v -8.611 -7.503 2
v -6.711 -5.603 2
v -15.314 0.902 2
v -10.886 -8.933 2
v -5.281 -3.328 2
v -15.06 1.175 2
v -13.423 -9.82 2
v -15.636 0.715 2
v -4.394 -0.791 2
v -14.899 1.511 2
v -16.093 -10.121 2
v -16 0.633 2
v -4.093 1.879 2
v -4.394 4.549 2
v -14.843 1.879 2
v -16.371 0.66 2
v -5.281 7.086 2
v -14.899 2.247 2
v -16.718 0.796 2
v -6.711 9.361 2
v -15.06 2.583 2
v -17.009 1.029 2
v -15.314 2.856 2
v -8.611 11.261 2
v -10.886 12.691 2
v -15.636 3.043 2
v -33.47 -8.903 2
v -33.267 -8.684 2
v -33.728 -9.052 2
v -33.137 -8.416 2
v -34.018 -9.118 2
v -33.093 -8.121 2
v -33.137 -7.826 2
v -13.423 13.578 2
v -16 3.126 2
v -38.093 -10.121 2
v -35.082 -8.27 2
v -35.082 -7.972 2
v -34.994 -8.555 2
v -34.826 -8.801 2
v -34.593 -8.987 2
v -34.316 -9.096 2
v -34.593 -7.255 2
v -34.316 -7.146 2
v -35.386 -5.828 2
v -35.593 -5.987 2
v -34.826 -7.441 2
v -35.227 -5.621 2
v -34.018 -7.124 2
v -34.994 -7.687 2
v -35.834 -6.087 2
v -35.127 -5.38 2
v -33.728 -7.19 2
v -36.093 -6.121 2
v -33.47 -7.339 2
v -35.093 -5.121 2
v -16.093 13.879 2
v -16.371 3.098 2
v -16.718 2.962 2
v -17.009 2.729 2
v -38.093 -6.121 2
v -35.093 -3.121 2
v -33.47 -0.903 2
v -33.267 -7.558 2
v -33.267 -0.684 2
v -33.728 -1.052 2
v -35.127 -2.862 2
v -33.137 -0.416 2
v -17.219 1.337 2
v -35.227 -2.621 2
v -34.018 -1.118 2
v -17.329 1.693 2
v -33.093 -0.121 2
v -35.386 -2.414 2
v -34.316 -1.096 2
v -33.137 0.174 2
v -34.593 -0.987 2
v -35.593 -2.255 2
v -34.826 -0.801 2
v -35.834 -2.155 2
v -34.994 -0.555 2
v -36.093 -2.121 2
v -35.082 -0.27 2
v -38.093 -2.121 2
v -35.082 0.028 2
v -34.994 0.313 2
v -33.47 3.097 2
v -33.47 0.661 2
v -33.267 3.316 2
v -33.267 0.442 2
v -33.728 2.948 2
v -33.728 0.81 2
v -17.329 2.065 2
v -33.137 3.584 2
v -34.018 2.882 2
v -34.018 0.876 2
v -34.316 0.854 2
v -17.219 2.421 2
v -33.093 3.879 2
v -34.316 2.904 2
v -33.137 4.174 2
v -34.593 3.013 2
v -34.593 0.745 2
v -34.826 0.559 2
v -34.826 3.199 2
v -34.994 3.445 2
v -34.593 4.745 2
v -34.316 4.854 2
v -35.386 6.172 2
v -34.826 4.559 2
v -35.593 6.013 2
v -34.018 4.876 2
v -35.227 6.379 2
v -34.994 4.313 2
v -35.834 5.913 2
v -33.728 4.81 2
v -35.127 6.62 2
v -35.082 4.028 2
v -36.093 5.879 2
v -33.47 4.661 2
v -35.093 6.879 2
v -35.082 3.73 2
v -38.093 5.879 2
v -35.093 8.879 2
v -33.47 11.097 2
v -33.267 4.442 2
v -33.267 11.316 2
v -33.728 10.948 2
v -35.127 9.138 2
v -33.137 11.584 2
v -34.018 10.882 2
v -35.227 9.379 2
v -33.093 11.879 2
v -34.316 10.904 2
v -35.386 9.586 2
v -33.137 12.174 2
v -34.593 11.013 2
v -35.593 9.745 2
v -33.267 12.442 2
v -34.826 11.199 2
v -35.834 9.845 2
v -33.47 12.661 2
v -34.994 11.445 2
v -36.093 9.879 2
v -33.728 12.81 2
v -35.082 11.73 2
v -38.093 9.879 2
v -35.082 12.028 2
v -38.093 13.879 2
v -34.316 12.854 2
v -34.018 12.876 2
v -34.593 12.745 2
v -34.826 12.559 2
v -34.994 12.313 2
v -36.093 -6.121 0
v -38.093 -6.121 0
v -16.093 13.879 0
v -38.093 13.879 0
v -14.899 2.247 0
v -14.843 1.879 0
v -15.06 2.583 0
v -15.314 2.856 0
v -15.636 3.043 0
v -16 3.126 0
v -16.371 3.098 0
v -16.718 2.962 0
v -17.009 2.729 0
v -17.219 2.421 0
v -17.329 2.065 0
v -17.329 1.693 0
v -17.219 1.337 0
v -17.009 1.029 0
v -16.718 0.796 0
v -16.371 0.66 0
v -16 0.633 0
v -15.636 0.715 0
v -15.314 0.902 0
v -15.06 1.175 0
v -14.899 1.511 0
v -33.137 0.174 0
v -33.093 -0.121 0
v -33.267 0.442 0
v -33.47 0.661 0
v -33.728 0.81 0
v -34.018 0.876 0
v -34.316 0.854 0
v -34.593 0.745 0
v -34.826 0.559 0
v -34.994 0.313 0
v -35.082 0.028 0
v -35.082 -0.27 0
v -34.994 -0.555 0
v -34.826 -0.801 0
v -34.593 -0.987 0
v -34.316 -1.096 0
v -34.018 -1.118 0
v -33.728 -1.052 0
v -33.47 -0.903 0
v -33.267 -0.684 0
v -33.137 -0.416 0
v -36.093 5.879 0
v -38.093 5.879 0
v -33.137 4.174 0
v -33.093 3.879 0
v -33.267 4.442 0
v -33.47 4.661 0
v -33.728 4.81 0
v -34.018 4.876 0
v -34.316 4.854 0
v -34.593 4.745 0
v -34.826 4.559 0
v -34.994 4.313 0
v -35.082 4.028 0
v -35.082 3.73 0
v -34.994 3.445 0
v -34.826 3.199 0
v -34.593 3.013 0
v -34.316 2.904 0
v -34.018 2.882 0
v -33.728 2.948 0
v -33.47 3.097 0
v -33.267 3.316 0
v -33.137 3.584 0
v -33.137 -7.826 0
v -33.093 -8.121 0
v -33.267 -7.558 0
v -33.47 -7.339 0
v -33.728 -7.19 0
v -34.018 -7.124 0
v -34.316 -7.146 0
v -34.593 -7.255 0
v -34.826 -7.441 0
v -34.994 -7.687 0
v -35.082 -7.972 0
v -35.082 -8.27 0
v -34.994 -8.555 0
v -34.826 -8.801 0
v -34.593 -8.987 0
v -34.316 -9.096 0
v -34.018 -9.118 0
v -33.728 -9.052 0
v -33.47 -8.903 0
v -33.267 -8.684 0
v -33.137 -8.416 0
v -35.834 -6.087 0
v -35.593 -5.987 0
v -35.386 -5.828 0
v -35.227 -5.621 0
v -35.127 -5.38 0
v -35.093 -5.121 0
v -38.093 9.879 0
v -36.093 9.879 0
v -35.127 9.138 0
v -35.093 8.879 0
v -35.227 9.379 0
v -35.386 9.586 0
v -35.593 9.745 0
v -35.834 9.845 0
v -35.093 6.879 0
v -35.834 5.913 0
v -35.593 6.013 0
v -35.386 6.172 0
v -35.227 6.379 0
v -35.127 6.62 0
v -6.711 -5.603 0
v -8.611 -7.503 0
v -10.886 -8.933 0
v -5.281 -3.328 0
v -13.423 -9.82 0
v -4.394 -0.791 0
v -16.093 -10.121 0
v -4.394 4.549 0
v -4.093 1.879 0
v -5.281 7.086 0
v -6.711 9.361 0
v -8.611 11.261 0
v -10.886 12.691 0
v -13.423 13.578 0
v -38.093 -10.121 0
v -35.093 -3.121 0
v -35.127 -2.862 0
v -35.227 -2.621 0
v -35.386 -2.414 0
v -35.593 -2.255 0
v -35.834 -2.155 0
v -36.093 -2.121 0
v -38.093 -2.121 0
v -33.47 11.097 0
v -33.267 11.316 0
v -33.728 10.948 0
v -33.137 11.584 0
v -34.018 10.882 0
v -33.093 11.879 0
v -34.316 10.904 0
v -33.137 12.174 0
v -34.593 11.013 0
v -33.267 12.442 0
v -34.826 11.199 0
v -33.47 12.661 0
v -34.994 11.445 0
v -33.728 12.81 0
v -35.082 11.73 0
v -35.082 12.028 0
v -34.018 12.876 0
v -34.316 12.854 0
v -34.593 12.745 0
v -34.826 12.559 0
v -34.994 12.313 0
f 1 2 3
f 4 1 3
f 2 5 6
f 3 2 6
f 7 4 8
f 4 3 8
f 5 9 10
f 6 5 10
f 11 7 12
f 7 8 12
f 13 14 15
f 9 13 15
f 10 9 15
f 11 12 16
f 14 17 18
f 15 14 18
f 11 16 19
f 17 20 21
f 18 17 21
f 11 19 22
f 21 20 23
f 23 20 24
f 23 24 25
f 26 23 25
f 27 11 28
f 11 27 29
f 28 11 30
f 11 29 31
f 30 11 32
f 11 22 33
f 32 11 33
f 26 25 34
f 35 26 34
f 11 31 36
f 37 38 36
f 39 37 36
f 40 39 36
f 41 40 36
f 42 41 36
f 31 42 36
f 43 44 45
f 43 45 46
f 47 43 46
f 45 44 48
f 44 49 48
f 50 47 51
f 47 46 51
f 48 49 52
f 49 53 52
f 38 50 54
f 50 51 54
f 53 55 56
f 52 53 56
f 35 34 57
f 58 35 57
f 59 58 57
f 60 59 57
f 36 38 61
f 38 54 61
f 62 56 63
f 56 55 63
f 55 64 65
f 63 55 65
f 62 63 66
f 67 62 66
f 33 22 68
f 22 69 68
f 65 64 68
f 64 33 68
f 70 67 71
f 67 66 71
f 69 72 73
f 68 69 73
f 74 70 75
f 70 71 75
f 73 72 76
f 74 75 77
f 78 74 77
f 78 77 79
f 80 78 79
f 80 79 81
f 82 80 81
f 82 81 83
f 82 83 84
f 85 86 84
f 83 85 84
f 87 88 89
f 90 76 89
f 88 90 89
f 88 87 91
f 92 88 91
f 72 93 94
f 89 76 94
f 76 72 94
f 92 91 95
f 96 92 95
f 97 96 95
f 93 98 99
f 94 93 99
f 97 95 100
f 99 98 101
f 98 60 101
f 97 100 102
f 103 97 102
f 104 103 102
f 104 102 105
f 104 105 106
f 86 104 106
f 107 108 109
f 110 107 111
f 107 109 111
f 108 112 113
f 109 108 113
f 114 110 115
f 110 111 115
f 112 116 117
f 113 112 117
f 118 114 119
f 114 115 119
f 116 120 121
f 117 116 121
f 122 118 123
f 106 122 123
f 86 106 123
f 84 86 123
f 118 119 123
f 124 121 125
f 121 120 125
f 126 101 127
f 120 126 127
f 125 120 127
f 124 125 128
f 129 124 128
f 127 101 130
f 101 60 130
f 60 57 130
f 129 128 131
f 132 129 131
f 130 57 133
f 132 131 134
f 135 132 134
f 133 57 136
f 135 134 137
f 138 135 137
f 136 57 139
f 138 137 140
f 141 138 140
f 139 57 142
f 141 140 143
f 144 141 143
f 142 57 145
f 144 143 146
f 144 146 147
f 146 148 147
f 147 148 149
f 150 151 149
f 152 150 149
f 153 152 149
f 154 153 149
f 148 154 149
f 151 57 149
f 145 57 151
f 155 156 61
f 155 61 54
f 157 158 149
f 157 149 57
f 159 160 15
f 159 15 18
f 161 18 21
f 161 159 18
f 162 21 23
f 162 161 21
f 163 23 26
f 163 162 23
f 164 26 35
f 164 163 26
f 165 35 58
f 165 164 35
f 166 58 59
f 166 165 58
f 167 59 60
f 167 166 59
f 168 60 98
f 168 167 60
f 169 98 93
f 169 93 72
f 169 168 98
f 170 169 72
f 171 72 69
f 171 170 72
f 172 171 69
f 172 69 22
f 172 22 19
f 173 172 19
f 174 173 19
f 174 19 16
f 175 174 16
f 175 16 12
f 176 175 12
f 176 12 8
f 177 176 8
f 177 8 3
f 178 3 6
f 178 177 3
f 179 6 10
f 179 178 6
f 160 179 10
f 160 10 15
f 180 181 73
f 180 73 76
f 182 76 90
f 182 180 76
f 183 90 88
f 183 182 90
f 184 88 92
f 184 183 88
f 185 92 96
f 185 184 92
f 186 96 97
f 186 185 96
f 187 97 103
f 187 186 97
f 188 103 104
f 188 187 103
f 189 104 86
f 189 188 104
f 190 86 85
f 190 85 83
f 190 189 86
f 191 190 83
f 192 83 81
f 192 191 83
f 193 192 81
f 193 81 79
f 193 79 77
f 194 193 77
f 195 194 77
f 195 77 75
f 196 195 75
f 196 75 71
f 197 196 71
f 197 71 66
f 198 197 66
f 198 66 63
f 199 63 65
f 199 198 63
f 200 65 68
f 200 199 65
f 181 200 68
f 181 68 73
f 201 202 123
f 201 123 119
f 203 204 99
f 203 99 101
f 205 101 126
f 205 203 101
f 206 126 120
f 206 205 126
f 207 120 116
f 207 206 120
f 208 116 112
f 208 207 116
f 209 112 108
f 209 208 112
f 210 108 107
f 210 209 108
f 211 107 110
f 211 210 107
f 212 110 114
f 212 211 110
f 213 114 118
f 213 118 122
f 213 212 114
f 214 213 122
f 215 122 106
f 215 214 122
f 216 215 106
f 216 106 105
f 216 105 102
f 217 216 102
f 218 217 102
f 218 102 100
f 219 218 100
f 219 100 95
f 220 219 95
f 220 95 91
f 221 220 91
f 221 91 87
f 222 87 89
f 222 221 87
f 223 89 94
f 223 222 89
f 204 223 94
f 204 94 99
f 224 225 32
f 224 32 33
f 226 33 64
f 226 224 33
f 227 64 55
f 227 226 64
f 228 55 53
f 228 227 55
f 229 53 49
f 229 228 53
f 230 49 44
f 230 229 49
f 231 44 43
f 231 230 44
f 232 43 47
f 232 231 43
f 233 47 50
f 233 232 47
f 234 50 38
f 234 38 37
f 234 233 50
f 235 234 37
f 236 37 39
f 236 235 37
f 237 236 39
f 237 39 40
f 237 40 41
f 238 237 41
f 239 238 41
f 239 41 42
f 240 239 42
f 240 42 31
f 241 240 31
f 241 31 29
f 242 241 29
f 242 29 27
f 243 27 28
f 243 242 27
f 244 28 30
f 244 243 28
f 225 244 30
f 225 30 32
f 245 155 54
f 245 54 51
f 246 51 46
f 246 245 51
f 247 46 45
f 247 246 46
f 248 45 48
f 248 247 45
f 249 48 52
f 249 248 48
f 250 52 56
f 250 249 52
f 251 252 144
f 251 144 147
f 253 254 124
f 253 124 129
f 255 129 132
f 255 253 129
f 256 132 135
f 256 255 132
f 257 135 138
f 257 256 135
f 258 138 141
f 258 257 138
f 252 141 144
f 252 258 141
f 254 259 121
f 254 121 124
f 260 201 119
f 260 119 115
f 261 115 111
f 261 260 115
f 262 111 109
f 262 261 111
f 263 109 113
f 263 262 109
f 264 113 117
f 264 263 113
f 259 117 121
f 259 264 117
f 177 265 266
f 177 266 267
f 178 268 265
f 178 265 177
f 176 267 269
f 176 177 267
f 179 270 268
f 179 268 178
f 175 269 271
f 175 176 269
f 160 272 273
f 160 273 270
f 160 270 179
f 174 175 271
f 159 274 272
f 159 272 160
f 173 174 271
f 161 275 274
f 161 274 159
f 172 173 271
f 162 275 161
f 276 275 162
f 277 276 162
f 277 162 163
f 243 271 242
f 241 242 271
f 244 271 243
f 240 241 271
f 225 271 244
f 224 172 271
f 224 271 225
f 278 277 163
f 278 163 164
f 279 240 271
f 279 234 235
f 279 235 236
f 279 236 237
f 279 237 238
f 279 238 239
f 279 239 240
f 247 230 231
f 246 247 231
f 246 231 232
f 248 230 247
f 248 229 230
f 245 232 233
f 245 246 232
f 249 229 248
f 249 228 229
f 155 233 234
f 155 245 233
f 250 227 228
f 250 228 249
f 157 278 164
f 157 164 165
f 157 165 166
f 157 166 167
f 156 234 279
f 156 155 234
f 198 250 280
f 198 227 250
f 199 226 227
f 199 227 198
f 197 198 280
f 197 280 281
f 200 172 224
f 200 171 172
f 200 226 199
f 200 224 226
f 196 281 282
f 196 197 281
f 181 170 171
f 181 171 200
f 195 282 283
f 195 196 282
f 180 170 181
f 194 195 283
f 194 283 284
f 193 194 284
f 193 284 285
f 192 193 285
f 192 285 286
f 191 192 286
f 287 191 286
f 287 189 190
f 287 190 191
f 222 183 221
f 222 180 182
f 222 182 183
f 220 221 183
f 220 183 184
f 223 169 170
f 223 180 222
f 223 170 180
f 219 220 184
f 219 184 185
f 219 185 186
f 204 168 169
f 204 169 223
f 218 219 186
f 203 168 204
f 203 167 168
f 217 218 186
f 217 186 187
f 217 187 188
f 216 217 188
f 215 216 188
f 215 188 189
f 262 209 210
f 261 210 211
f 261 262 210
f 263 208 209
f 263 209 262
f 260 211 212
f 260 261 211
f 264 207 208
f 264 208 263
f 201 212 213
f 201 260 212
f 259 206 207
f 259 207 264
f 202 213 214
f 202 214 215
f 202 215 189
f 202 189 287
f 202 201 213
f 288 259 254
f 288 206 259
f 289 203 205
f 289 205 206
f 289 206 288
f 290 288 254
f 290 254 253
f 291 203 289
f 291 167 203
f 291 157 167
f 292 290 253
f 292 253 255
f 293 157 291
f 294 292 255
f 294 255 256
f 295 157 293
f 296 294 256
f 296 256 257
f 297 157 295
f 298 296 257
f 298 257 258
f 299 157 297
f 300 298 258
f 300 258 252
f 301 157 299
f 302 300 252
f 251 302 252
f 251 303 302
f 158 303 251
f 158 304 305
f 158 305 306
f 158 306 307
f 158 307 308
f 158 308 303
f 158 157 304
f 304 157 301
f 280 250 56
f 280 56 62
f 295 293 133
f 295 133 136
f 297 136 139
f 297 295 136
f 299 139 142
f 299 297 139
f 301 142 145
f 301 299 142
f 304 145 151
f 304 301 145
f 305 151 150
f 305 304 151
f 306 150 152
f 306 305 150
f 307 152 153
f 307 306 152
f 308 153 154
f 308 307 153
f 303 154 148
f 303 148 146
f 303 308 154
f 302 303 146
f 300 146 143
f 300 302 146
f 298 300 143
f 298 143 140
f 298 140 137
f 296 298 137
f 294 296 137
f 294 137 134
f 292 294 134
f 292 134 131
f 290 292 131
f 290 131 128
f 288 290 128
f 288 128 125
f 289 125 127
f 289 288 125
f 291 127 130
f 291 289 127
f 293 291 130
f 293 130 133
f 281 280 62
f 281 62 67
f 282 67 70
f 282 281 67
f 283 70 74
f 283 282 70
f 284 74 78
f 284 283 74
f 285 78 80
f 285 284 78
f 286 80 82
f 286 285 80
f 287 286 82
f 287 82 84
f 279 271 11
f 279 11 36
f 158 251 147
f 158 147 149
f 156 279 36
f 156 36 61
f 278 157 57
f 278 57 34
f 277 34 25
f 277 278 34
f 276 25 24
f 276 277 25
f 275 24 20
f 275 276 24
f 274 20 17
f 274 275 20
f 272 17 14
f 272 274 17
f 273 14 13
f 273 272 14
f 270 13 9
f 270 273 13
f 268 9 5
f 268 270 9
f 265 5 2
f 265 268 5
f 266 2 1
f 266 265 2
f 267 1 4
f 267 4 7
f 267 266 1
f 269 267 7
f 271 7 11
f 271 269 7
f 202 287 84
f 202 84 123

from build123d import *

# Parameters (mm, degrees)
SKETCH_1_R      = 1.25
SKETCH_1_R_2    = 1
EXTRUDE_1_DEPTH = 2


with BuildPart() as part:
    # 草圖1 → 填料-伸長1 (new body)
    with BuildSketch(Plane.XY):
        with BuildLine():
            Line((-38.093061493, 13.879025542), (-16.093061493, 13.879025542))
            ThreePointArc((-16.093061493, 13.879025542), (-4.093061493, 1.879025542), (-16.093061493, -10.120974458))
            Line((-16.093061493, -10.120974458), (-38.093061493, -10.120974458))
            Line((-38.093061493, -10.120974458), (-38.093061493, -6.120974458))
            Line((-38.093061493, -6.120974458), (-36.093061493, -6.120974458))
            ThreePointArc((-36.093061493, -6.120974458), (-35.385954712, -5.828081239), (-35.093061493, -5.120974458))
            Line((-35.093061493, -5.120974458), (-35.093061493, -3.120974458))
            ThreePointArc((-35.093061493, -3.120974458), (-35.385954712, -2.413867677), (-36.093061493, -2.120974458))
            Line((-36.093061493, -2.120974458), (-38.093061493, -2.120974458))
            Line((-38.093061493, -2.120974458), (-38.093061493, 5.879025542))
            Line((-38.093061493, 5.879025542), (-36.093061493, 5.879025542))
            ThreePointArc((-36.093061493, 5.879025542), (-35.385954712, 6.171918761), (-35.093061493, 6.879025542))
            Line((-35.093061493, 6.879025542), (-35.093061493, 8.879025542))
            ThreePointArc((-35.093061493, 8.879025542), (-35.385954712, 9.586132323), (-36.093061493, 9.879025542))
            Line((-36.093061493, 9.879025542), (-38.093061493, 9.879025542))
            Line((-38.093061493, 9.879025542), (-38.093061493, 13.879025542))
        make_face()
        with Locations((-16.093061493, 1.879025542)):
            Circle(SKETCH_1_R, mode=Mode.SUBTRACT)
        with Locations((-34.093061493, 11.879025542)):
            Circle(SKETCH_1_R_2, mode=Mode.SUBTRACT)
        with Locations((-34.093061493, 3.879025542)):
            Circle(SKETCH_1_R_2, mode=Mode.SUBTRACT)
        with Locations((-34.093061493, -8.120974458)):
            Circle(SKETCH_1_R_2, mode=Mode.SUBTRACT)
        with Locations((-34.093061493, -0.120974458)):
            Circle(SKETCH_1_R_2, mode=Mode.SUBTRACT)
    extrude(amount=EXTRUDE_1_DEPTH)


solid = part.part
